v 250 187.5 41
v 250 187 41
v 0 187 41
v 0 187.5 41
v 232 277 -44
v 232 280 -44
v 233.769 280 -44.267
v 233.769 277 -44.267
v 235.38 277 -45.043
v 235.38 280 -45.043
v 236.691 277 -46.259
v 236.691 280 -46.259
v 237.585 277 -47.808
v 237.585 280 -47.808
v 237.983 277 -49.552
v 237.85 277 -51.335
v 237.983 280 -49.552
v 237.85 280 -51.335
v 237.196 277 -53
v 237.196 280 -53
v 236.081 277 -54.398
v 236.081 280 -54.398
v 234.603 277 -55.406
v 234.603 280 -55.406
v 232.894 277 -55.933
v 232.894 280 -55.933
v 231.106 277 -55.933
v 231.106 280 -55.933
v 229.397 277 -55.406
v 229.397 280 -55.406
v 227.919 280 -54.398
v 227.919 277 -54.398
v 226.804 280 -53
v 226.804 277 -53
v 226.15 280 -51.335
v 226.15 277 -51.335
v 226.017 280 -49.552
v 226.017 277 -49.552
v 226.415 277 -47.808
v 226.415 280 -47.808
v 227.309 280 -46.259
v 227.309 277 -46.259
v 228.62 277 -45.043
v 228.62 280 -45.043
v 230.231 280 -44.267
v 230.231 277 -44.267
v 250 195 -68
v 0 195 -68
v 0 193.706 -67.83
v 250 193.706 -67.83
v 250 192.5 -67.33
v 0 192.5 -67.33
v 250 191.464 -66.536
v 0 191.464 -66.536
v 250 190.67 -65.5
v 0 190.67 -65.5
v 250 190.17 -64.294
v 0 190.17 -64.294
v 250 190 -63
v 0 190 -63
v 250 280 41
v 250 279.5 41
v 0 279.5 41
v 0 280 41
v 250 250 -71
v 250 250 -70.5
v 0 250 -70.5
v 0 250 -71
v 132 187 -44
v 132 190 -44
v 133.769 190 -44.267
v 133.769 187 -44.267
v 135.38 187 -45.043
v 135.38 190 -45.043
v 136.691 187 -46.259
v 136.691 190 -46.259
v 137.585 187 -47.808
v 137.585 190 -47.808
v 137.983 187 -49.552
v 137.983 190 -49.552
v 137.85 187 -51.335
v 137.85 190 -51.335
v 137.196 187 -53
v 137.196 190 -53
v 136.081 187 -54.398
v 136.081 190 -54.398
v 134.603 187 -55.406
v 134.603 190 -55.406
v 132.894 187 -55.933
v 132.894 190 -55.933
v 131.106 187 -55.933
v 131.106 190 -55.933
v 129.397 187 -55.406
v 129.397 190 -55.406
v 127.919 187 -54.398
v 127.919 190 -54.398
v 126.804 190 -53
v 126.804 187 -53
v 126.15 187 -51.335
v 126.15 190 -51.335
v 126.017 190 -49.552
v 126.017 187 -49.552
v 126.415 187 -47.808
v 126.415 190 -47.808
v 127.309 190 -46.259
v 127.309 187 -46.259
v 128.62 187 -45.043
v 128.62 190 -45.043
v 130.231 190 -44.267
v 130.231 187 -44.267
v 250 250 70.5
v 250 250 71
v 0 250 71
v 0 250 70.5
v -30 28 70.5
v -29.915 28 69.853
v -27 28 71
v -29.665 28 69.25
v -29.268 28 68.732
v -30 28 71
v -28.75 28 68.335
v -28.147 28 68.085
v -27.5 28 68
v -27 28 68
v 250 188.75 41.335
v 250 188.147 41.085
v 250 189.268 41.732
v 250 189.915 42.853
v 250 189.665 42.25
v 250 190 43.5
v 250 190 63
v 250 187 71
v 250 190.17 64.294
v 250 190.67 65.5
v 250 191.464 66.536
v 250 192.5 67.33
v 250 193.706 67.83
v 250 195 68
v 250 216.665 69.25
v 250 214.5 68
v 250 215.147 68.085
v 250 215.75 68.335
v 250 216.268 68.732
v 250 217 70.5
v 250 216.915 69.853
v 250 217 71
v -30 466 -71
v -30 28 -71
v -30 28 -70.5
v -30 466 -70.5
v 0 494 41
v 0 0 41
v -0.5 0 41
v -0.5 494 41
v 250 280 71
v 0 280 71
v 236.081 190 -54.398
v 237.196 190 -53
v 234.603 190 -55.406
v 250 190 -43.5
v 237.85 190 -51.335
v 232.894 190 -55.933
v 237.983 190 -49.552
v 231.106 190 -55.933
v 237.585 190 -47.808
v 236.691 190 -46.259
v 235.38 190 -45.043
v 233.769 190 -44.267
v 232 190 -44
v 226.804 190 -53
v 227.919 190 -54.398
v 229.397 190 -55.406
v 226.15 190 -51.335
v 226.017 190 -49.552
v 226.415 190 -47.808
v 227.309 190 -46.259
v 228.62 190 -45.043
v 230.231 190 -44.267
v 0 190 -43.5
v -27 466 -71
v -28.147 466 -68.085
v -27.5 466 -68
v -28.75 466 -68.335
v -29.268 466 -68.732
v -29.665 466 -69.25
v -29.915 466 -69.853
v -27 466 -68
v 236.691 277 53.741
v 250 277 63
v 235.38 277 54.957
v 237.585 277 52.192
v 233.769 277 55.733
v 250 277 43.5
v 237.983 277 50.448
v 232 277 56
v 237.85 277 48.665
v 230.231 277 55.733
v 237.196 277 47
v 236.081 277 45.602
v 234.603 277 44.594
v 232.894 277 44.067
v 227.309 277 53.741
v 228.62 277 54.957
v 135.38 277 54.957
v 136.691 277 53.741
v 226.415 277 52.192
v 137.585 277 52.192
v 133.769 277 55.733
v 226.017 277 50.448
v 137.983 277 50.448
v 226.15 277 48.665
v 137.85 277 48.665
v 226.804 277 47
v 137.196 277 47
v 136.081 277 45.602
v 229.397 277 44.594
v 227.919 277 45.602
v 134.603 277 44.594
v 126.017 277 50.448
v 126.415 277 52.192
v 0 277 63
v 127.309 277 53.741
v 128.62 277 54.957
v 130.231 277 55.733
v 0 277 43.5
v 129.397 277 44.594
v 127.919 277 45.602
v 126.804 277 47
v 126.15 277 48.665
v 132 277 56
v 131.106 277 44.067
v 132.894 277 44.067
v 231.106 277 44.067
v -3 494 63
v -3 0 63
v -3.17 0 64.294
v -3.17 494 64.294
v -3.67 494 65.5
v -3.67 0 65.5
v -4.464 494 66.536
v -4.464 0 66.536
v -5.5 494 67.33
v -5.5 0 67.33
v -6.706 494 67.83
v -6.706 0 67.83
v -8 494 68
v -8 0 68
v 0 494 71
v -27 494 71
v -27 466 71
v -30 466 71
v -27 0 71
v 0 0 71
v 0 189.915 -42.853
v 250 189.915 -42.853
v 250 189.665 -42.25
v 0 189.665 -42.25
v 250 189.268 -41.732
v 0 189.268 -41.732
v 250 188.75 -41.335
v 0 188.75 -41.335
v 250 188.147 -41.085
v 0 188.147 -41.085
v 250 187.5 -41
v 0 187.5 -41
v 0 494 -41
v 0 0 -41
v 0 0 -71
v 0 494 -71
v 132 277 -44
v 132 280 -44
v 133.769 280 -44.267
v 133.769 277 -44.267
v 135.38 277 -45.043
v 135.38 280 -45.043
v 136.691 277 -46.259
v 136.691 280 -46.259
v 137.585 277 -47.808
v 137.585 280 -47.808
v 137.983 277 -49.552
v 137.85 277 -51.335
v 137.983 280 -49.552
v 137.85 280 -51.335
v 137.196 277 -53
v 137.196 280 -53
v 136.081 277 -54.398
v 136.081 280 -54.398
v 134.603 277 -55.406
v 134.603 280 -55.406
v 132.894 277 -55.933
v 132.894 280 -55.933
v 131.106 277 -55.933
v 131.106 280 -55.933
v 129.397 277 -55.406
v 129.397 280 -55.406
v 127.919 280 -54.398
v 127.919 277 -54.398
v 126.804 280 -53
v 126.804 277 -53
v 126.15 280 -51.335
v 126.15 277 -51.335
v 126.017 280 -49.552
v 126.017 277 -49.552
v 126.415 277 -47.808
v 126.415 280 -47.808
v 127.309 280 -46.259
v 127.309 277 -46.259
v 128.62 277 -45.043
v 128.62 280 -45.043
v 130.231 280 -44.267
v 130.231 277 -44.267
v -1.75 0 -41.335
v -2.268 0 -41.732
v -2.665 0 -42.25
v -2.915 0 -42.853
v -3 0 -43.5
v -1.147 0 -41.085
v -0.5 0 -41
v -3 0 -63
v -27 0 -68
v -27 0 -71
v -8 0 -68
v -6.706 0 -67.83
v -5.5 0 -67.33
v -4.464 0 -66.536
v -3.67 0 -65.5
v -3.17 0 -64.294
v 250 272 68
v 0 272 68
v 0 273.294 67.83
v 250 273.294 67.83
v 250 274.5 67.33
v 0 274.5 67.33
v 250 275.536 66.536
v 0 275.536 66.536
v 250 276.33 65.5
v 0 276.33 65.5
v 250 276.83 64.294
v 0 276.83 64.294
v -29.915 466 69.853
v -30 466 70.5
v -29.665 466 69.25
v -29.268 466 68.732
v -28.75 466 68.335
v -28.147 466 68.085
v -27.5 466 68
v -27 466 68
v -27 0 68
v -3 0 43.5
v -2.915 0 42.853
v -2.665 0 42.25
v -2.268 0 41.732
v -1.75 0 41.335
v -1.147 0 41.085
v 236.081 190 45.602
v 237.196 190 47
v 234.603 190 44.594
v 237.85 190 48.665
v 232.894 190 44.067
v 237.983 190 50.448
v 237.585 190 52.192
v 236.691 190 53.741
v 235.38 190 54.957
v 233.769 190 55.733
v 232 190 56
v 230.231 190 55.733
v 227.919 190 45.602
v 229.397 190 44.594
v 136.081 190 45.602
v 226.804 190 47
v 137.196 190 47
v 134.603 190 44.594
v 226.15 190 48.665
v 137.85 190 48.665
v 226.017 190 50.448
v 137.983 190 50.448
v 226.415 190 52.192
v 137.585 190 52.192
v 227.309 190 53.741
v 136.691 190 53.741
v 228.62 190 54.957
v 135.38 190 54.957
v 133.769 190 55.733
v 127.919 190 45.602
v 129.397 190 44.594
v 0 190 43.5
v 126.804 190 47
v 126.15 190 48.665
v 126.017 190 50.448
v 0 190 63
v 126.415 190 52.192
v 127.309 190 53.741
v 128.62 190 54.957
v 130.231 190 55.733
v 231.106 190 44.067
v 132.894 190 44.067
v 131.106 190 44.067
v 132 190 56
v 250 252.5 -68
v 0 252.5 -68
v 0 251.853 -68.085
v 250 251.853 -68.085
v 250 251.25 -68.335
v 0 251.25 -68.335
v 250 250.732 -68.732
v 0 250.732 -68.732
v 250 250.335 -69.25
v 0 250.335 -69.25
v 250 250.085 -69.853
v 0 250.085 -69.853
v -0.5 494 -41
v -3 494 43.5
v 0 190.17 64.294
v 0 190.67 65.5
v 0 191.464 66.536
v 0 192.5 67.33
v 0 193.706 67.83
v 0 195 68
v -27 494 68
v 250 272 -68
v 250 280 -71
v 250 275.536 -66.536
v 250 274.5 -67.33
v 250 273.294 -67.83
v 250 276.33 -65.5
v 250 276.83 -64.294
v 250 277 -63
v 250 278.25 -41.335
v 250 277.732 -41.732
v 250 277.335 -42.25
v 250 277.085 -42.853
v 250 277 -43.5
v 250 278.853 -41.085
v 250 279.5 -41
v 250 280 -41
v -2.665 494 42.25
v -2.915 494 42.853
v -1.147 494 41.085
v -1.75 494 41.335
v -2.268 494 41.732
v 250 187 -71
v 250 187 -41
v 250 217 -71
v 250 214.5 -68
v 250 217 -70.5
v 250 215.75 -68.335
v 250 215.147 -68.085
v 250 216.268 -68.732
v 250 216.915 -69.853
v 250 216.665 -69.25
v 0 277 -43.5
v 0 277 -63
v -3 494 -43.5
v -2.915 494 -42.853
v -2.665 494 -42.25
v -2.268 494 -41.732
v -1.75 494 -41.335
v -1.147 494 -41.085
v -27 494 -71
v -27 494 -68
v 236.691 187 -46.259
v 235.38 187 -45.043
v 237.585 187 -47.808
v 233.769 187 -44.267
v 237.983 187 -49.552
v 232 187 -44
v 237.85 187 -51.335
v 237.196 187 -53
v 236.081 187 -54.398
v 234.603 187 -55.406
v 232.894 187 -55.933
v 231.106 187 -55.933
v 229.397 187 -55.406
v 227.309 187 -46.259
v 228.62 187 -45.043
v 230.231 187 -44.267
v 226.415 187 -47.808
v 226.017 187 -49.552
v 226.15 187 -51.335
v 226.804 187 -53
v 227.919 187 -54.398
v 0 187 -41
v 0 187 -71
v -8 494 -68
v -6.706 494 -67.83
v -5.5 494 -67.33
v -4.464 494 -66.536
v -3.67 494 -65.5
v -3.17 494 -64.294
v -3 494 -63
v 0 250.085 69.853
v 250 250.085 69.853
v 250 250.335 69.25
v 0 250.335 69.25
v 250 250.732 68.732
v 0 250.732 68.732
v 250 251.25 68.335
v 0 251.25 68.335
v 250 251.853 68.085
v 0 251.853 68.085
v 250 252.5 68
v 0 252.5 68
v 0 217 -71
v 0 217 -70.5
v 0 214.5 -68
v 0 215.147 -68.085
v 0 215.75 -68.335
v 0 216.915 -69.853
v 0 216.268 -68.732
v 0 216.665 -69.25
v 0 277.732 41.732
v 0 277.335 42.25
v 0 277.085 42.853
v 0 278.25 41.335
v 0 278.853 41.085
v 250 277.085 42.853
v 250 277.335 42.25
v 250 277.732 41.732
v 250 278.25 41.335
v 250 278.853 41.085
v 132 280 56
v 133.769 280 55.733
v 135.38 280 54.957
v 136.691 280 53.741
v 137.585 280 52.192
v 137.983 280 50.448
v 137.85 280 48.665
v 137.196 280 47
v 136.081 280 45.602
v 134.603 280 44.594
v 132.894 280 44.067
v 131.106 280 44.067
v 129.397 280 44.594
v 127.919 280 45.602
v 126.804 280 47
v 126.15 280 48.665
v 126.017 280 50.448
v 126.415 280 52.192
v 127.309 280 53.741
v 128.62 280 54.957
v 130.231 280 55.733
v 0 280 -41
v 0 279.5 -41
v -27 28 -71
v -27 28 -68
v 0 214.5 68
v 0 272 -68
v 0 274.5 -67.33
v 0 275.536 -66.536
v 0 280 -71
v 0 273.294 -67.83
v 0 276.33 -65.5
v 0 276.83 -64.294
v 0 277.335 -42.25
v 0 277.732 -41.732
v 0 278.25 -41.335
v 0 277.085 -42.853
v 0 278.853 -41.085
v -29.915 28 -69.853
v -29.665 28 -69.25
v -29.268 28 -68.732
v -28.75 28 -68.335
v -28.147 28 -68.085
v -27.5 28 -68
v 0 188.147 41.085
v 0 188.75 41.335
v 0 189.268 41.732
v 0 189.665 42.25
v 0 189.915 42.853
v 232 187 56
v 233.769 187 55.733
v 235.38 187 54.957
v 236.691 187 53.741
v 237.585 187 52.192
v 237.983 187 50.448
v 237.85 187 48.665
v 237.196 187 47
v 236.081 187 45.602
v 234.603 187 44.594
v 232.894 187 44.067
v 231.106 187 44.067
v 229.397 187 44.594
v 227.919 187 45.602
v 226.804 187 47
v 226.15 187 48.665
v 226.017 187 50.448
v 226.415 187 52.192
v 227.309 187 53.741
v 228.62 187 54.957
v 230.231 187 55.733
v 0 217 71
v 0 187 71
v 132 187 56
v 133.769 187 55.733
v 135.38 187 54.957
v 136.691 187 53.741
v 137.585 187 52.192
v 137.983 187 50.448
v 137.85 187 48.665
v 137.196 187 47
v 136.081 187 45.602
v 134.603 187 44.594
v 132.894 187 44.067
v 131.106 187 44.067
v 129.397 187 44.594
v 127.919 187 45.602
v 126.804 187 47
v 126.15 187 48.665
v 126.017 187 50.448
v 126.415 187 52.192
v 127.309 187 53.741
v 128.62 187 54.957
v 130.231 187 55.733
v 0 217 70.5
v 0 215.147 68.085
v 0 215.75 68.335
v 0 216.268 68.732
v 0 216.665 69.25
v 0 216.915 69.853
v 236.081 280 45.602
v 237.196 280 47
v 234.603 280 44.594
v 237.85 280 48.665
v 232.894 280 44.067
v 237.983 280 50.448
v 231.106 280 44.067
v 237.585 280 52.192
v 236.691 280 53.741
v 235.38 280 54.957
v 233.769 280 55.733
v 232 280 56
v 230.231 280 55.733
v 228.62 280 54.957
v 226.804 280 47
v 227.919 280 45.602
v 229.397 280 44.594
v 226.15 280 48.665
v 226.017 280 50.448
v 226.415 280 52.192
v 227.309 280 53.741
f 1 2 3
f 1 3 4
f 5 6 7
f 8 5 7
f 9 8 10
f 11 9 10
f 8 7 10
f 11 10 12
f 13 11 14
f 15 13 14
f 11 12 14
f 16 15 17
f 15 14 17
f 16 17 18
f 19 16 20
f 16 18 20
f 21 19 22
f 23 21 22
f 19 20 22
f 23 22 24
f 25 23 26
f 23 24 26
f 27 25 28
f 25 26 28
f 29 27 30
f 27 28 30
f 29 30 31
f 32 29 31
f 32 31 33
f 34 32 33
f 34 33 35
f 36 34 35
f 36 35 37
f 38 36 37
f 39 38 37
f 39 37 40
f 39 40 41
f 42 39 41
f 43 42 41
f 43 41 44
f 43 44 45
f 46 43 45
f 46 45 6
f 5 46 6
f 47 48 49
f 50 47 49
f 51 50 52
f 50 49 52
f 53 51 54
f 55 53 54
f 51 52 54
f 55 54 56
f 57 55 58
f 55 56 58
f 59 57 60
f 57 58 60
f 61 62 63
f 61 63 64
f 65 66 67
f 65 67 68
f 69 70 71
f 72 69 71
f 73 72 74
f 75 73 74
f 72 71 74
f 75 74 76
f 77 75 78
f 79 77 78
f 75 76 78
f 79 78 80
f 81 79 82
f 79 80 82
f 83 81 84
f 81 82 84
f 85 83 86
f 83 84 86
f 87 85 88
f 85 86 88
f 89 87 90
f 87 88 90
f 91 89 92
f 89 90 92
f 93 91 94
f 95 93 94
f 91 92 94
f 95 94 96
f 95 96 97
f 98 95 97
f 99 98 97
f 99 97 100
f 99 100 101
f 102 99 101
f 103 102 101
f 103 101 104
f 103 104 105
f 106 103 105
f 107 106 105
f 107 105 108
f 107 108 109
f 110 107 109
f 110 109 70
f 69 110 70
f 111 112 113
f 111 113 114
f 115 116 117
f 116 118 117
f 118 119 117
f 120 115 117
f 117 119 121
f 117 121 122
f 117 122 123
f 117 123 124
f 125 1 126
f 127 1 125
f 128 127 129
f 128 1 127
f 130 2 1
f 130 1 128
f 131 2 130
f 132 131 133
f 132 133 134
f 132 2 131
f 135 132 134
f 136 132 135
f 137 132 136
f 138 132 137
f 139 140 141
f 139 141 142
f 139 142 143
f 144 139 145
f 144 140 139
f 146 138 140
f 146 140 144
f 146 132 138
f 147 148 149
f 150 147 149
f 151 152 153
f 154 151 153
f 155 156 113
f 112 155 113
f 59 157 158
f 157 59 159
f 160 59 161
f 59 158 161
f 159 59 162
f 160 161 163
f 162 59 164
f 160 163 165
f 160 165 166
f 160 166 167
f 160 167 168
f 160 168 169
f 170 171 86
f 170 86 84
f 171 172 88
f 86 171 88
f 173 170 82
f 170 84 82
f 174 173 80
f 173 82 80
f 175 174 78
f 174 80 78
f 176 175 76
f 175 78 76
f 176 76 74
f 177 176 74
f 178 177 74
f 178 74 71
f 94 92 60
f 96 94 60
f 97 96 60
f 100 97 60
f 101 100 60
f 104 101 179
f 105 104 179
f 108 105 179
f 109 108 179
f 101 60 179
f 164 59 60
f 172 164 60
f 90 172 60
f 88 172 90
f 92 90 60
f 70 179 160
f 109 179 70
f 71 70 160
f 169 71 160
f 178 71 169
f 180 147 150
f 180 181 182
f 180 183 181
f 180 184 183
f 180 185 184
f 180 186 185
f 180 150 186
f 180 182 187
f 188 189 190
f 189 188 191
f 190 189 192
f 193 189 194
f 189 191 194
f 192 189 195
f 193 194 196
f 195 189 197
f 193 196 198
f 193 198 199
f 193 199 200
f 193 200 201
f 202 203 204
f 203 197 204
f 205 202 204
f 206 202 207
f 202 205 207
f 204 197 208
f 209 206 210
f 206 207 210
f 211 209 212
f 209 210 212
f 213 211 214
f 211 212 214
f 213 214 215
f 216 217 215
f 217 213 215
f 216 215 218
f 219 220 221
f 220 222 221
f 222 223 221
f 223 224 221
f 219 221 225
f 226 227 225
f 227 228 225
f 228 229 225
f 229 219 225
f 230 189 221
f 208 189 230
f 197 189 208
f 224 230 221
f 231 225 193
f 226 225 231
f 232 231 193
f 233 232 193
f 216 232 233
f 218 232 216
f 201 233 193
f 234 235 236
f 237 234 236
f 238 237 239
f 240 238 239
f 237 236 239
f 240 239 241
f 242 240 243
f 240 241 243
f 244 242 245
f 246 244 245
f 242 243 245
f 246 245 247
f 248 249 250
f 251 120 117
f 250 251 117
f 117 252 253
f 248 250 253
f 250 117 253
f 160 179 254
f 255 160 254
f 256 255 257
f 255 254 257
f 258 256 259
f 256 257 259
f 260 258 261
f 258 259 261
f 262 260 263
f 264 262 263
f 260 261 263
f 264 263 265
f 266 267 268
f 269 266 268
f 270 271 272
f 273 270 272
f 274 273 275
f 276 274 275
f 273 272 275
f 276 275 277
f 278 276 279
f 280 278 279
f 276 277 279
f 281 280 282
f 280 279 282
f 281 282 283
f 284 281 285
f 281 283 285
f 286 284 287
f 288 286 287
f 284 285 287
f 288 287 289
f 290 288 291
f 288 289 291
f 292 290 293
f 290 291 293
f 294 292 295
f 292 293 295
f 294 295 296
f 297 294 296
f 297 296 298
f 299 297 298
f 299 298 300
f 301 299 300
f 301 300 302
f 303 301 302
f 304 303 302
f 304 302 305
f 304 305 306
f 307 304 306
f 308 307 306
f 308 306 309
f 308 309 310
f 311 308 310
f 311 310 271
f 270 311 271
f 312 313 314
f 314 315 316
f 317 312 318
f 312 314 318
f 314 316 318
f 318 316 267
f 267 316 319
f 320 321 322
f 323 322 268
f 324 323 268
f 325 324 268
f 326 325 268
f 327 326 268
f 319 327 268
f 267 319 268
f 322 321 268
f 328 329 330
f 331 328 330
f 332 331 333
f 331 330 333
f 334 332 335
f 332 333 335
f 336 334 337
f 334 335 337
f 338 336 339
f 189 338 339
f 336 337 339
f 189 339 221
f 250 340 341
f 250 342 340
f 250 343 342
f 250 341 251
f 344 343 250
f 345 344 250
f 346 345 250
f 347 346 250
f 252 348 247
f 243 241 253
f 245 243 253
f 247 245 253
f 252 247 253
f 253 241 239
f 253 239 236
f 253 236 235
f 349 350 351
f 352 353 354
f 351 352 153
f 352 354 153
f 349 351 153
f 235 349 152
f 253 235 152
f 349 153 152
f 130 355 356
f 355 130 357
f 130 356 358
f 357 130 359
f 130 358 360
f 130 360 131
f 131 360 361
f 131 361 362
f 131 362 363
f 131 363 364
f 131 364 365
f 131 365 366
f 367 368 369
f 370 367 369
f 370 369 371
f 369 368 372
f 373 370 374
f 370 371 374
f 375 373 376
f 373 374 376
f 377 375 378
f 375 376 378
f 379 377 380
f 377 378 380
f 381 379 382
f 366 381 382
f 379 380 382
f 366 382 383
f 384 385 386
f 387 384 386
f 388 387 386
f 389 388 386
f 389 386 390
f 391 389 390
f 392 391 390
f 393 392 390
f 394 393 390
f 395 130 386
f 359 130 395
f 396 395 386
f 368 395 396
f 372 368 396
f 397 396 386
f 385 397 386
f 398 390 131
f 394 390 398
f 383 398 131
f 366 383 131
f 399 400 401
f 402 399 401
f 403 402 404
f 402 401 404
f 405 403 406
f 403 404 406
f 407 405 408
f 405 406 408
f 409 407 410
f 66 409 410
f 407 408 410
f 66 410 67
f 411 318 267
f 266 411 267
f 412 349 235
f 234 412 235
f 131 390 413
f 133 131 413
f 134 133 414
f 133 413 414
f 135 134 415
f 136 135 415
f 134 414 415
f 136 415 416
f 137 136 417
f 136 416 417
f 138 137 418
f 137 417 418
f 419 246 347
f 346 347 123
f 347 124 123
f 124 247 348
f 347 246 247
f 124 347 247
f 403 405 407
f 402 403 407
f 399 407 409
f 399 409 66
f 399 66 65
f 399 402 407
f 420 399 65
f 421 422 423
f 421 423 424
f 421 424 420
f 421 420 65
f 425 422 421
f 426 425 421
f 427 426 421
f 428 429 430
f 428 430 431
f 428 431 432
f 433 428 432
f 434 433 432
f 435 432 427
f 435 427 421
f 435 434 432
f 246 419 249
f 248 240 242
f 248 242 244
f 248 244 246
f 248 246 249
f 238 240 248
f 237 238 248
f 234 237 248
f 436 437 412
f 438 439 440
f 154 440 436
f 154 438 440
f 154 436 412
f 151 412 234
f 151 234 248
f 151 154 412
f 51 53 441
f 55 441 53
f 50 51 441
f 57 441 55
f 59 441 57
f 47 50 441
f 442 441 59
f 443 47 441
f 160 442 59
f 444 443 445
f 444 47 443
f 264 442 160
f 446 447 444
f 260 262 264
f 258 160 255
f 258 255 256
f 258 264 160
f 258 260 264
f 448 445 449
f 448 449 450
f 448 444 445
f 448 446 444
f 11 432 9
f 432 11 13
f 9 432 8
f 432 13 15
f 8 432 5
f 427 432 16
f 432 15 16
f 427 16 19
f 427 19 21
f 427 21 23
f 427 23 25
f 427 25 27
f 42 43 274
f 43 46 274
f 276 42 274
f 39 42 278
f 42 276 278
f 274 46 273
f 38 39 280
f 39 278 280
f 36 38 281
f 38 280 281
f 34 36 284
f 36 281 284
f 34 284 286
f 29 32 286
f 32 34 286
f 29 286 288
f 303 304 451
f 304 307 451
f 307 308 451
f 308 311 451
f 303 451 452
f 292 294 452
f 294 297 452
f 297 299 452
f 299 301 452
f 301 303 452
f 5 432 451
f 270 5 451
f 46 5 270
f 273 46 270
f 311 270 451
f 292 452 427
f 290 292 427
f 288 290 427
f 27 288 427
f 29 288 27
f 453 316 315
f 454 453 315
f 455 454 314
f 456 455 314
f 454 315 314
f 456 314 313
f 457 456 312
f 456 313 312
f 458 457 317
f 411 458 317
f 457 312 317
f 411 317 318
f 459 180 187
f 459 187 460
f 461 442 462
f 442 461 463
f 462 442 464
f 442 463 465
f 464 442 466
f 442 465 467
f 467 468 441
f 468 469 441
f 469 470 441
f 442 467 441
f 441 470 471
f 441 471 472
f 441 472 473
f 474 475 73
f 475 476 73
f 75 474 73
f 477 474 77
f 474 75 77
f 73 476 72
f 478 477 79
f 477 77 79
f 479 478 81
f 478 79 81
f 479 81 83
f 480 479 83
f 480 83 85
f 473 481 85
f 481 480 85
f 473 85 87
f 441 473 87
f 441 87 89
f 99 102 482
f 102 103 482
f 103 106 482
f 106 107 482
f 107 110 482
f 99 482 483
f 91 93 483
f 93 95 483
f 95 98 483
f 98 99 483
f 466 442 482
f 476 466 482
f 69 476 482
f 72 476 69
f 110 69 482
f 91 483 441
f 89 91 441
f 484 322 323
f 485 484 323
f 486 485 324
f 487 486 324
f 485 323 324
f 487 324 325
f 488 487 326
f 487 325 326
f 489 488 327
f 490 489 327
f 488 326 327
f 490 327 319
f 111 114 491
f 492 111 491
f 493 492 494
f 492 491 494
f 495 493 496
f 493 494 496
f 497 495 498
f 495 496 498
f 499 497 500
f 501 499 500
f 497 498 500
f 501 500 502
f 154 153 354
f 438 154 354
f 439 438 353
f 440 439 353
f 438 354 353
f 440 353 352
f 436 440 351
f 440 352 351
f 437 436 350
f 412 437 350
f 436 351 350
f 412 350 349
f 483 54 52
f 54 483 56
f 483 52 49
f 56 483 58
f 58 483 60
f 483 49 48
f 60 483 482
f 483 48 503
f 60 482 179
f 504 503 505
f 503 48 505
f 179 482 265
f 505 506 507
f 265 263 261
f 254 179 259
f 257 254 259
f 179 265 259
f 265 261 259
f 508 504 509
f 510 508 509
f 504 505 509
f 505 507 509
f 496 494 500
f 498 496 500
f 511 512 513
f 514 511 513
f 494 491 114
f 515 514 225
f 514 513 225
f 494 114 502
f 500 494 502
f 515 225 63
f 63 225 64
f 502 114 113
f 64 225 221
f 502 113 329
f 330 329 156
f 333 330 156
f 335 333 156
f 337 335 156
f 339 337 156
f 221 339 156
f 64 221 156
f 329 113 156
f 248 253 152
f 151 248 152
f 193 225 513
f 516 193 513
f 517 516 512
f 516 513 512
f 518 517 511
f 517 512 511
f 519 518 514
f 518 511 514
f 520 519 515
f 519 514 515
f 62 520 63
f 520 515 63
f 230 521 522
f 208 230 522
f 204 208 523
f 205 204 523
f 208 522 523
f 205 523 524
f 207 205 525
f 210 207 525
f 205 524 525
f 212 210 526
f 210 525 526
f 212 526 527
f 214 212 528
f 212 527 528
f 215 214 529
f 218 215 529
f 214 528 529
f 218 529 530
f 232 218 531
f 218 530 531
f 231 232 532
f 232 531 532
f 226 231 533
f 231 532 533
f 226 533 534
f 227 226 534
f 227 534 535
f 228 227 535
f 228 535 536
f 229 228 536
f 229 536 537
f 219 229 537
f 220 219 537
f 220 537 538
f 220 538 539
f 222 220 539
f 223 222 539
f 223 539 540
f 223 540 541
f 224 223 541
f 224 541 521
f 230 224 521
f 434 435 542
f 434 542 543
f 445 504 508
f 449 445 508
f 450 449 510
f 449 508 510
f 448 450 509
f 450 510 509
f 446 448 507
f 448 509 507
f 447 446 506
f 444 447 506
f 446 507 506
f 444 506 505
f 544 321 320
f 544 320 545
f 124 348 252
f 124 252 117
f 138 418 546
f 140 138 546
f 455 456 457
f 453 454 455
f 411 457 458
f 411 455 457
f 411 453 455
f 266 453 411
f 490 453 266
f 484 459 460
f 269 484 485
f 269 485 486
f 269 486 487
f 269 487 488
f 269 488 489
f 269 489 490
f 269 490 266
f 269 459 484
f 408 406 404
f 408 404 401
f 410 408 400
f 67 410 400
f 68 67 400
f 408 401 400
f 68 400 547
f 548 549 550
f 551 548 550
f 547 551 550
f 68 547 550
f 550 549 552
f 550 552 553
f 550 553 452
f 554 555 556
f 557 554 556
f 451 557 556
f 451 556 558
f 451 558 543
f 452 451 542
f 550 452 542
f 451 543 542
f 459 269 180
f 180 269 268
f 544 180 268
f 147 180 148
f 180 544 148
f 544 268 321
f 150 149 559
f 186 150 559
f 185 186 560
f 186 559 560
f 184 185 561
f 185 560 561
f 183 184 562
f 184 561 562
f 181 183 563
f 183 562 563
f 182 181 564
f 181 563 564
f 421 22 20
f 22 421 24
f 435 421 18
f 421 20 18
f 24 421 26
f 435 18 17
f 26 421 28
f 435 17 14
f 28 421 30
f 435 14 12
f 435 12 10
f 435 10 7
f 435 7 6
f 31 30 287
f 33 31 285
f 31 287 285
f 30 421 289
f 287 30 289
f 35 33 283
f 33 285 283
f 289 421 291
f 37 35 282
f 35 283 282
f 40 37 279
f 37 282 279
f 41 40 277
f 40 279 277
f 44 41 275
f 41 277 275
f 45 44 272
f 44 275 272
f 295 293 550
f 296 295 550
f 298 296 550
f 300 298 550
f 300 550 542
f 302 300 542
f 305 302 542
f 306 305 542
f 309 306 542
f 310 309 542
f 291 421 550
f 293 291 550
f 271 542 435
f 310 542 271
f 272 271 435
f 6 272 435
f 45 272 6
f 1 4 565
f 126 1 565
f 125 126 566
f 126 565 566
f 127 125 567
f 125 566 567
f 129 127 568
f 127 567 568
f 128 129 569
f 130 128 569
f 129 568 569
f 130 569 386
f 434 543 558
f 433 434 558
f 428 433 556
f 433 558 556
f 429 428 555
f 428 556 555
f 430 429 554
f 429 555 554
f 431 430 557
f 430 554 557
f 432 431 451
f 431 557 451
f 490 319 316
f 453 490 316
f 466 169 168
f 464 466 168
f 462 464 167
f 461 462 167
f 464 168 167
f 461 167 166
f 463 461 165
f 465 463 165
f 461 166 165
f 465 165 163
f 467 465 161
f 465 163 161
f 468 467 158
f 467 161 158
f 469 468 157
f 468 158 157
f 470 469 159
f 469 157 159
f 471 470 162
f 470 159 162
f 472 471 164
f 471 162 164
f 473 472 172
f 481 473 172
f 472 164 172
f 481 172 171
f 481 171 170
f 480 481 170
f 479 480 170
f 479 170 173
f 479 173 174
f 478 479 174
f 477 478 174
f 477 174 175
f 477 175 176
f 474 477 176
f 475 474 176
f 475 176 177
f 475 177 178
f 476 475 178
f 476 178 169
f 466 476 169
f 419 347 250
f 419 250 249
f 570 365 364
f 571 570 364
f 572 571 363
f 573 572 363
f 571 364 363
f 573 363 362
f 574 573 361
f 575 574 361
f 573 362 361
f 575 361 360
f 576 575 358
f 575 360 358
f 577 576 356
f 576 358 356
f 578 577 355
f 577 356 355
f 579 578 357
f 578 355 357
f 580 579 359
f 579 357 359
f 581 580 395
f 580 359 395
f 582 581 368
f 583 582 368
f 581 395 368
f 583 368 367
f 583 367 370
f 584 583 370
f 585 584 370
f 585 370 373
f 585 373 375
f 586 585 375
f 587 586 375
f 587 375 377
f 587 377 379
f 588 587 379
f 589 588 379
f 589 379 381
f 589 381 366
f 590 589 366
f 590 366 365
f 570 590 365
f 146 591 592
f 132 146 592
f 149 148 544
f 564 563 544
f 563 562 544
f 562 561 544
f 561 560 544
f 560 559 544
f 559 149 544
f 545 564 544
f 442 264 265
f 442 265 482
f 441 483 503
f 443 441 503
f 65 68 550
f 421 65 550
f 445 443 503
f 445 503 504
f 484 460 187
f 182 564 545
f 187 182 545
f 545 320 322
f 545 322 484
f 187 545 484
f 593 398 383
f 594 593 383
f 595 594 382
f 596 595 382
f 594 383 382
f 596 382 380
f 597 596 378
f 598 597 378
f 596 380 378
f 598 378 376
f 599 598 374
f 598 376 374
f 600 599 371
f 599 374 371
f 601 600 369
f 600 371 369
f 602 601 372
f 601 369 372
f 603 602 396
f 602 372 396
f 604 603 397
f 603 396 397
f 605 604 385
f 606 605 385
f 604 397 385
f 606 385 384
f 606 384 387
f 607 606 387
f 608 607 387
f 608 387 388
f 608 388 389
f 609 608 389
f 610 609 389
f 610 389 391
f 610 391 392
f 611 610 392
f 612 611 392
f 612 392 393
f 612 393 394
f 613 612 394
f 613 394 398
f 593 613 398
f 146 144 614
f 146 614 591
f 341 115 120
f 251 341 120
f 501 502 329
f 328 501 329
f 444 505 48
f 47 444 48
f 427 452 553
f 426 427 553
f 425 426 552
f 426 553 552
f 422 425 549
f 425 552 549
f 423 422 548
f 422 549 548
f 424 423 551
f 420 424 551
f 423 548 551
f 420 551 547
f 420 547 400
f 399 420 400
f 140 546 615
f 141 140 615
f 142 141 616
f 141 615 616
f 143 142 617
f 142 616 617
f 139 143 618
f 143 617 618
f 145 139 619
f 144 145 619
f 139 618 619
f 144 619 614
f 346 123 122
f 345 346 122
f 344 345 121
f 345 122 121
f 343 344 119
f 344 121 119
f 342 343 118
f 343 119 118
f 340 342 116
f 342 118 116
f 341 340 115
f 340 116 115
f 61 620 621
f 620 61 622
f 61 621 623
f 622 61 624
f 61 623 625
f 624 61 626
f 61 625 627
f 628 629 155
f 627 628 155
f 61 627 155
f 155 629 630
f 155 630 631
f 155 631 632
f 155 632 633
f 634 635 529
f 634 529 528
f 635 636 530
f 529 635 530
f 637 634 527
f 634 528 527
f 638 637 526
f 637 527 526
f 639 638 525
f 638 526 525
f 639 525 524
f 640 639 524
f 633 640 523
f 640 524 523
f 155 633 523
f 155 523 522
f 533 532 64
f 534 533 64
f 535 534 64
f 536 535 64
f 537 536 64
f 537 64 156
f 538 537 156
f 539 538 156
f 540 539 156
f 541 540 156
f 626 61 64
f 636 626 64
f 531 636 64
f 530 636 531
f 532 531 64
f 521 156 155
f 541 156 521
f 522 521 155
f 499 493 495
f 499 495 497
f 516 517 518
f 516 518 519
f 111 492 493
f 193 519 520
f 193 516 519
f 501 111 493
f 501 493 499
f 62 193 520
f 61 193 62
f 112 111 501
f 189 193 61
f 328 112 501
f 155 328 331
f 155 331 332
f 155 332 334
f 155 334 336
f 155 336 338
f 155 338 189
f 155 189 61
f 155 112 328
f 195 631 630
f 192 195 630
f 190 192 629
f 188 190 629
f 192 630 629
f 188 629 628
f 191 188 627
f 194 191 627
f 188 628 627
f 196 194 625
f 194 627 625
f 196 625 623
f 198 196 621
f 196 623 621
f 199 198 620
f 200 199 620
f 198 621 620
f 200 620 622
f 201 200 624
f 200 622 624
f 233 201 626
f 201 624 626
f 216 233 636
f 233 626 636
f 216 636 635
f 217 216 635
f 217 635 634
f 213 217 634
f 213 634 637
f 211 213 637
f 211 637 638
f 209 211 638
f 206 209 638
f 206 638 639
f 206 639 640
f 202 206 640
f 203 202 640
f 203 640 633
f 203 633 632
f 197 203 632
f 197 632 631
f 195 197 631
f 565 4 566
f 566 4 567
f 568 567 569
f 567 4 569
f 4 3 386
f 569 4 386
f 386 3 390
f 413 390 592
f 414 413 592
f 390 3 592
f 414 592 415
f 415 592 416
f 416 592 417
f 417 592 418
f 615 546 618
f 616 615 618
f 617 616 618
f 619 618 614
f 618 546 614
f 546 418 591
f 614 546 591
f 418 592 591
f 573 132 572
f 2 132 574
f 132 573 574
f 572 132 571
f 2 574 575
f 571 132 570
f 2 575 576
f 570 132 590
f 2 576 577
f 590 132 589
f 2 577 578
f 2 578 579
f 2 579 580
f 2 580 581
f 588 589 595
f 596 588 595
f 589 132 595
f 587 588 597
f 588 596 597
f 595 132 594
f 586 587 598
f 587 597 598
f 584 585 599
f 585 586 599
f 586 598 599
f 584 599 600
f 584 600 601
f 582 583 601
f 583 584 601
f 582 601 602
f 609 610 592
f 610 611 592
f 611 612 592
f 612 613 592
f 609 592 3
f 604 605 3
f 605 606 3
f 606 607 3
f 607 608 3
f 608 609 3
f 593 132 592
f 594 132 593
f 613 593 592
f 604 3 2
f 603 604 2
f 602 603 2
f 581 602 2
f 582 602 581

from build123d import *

# Parameters (mm, degrees)
STRUCTURE_SYSTEM1_DEPTH   = 494
STRUCTURE_SYSTEM1_2_DEPTH = 250
CUT_EXTRUDE1_DEPTH        = 572.576766498
CUT_EXTRUDE1_DEPTH_BACK   = 572.576766498
SKETCH2_W                 = 3
SKETCH2_H                 = 28
SKETCH3_R                 = 6
CUT_EXTRUDE2_DEPTH        = 383.022250661


# Read off the part's stored shape, not the designer's step: Structure System1
with BuildPart() as part:
    # Structure System1 outline → Structure System1 (new body)
    with BuildSketch(Plane(origin=(0, 0, 0), x_dir=(1, 0, 0), z_dir=(0, 1, 0))):
        with BuildLine():
            Line((0, 41), (0, 71))
            Line((0, 71), (-30, 71))
            Line((-30, 71), (-30, 70.5))
            ThreePointArc((-30, 70.5), (-29.267766953, 68.732233047), (-27.5, 68))
            Line((-27.5, 68), (-8, 68))
            ThreePointArc((-8, 68), (-4.464466094, 66.535533906), (-3, 63))
            Line((-3, 63), (-3, 43.5))
            ThreePointArc((-3, 43.5), (-2.267766953, 41.732233047), (-0.5, 41))
            Line((-0.5, 41), (0, 41))
        make_face()
        with BuildLine():
            Line((-30, -71), (0, -71))
            Line((0, -71), (0, -41))
            Line((0, -41), (-0.5, -41))
            ThreePointArc((-0.5, -41), (-2.267766953, -41.732233047), (-3, -43.5))
            Line((-3, -43.5), (-3, -63))
            ThreePointArc((-3, -63), (-4.464466094, -66.535533906), (-8, -68))
            Line((-8, -68), (-27.5, -68))
            ThreePointArc((-27.5, -68), (-29.267766953, -68.732233047), (-30, -70.5))
            Line((-30, -70.5), (-30, -71))
        make_face()
    extrude(amount=STRUCTURE_SYSTEM1_DEPTH)

    # Sketch2 → Cut-Extrude1 (cut, two sides: drawn at the far end of the back side and taken through both)
    with BuildSketch(Plane.XY.offset(71).offset(-CUT_EXTRUDE1_DEPTH_BACK)):
        with Locations((-28.5, 14)):
            Rectangle(SKETCH2_W, SKETCH2_H)
        with Locations((-28.5, 480)):
            Rectangle(SKETCH2_W, SKETCH2_H)
    extrude(amount=CUT_EXTRUDE1_DEPTH + CUT_EXTRUDE1_DEPTH_BACK, mode=Mode.SUBTRACT)


with BuildPart() as body_2:
    # Structure System1 2 outline → Structure System1 2 (new body)
    with BuildSketch(Plane.YZ):
        with BuildLine():
            Line((187, -41), (187, -71))
            Line((187, -71), (217, -71))
            Line((217, -71), (217, -70.5))
            ThreePointArc((217, -70.5), (216.267766953, -68.732233047), (214.5, -68))
            Line((214.5, -68), (195, -68))
            ThreePointArc((195, -68), (191.464466094, -66.535533906), (190, -63))
            Line((190, -63), (190, -43.5))
            ThreePointArc((190, -43.5), (189.267766953, -41.732233047), (187.5, -41))
            Line((187.5, -41), (187, -41))
        make_face()
        with BuildLine():
            Line((250, -71), (280, -71))
            Line((280, -71), (280, -41))
            Line((280, -41), (279.5, -41))
            ThreePointArc((279.5, -41), (277.732233047, -41.732233047), (277, -43.5))
            Line((277, -43.5), (277, -63))
            ThreePointArc((277, -63), (275.535533906, -66.535533906), (272, -68))
            Line((272, -68), (252.5, -68))
            ThreePointArc((252.5, -68), (250.732233047, -68.732233047), (250, -70.5))
            Line((250, -70.5), (250, -71))
        make_face()
        with BuildLine():
            Line((280, 41), (280, 71))
            Line((280, 71), (250, 71))
            Line((250, 71), (250, 70.5))
            ThreePointArc((250, 70.5), (250.732233047, 68.732233047), (252.5, 68))
            Line((252.5, 68), (272, 68))
            ThreePointArc((272, 68), (275.535533906, 66.535533906), (277, 63))
            Line((277, 63), (277, 43.5))
            ThreePointArc((277, 43.5), (277.732233047, 41.732233047), (279.5, 41))
            Line((279.5, 41), (280, 41))
        make_face()
        with BuildLine():
            Line((217, 71), (187, 71))
            Line((187, 71), (187, 41))
            Line((187, 41), (187.5, 41))
            ThreePointArc((187.5, 41), (189.267766953, 41.732233047), (190, 43.5))
            Line((190, 43.5), (190, 63))
            ThreePointArc((190, 63), (191.464466094, 66.535533906), (195, 68))
            Line((195, 68), (214.5, 68))
            ThreePointArc((214.5, 68), (216.267766953, 68.732233047), (217, 70.5))
            Line((217, 70.5), (217, 71))
        make_face()
    extrude(amount=STRUCTURE_SYSTEM1_2_DEPTH)

    # Sketch3 → Cut-Extrude2 (cut, through all)
    with BuildSketch(Plane(origin=(0, 280, 0), x_dir=(1, 0, 0), z_dir=(0, 1, 0))):
        with Locations(Location((232, 50, 0), (0, 0, 270))):
            Circle(SKETCH3_R)
        with Locations(Location((232, -50, 0), (0, 0, 270))):
            Circle(SKETCH3_R)
        with Locations(Location((132, -50, 0), (0, 0, 270))):
            Circle(SKETCH3_R)
        with Locations(Location((132, 50, 0), (0, 0, 270))):
            Circle(SKETCH3_R)
    extrude(amount=-CUT_EXTRUDE2_DEPTH, mode=Mode.SUBTRACT)


solid = Compound([part.part, body_2.part])
